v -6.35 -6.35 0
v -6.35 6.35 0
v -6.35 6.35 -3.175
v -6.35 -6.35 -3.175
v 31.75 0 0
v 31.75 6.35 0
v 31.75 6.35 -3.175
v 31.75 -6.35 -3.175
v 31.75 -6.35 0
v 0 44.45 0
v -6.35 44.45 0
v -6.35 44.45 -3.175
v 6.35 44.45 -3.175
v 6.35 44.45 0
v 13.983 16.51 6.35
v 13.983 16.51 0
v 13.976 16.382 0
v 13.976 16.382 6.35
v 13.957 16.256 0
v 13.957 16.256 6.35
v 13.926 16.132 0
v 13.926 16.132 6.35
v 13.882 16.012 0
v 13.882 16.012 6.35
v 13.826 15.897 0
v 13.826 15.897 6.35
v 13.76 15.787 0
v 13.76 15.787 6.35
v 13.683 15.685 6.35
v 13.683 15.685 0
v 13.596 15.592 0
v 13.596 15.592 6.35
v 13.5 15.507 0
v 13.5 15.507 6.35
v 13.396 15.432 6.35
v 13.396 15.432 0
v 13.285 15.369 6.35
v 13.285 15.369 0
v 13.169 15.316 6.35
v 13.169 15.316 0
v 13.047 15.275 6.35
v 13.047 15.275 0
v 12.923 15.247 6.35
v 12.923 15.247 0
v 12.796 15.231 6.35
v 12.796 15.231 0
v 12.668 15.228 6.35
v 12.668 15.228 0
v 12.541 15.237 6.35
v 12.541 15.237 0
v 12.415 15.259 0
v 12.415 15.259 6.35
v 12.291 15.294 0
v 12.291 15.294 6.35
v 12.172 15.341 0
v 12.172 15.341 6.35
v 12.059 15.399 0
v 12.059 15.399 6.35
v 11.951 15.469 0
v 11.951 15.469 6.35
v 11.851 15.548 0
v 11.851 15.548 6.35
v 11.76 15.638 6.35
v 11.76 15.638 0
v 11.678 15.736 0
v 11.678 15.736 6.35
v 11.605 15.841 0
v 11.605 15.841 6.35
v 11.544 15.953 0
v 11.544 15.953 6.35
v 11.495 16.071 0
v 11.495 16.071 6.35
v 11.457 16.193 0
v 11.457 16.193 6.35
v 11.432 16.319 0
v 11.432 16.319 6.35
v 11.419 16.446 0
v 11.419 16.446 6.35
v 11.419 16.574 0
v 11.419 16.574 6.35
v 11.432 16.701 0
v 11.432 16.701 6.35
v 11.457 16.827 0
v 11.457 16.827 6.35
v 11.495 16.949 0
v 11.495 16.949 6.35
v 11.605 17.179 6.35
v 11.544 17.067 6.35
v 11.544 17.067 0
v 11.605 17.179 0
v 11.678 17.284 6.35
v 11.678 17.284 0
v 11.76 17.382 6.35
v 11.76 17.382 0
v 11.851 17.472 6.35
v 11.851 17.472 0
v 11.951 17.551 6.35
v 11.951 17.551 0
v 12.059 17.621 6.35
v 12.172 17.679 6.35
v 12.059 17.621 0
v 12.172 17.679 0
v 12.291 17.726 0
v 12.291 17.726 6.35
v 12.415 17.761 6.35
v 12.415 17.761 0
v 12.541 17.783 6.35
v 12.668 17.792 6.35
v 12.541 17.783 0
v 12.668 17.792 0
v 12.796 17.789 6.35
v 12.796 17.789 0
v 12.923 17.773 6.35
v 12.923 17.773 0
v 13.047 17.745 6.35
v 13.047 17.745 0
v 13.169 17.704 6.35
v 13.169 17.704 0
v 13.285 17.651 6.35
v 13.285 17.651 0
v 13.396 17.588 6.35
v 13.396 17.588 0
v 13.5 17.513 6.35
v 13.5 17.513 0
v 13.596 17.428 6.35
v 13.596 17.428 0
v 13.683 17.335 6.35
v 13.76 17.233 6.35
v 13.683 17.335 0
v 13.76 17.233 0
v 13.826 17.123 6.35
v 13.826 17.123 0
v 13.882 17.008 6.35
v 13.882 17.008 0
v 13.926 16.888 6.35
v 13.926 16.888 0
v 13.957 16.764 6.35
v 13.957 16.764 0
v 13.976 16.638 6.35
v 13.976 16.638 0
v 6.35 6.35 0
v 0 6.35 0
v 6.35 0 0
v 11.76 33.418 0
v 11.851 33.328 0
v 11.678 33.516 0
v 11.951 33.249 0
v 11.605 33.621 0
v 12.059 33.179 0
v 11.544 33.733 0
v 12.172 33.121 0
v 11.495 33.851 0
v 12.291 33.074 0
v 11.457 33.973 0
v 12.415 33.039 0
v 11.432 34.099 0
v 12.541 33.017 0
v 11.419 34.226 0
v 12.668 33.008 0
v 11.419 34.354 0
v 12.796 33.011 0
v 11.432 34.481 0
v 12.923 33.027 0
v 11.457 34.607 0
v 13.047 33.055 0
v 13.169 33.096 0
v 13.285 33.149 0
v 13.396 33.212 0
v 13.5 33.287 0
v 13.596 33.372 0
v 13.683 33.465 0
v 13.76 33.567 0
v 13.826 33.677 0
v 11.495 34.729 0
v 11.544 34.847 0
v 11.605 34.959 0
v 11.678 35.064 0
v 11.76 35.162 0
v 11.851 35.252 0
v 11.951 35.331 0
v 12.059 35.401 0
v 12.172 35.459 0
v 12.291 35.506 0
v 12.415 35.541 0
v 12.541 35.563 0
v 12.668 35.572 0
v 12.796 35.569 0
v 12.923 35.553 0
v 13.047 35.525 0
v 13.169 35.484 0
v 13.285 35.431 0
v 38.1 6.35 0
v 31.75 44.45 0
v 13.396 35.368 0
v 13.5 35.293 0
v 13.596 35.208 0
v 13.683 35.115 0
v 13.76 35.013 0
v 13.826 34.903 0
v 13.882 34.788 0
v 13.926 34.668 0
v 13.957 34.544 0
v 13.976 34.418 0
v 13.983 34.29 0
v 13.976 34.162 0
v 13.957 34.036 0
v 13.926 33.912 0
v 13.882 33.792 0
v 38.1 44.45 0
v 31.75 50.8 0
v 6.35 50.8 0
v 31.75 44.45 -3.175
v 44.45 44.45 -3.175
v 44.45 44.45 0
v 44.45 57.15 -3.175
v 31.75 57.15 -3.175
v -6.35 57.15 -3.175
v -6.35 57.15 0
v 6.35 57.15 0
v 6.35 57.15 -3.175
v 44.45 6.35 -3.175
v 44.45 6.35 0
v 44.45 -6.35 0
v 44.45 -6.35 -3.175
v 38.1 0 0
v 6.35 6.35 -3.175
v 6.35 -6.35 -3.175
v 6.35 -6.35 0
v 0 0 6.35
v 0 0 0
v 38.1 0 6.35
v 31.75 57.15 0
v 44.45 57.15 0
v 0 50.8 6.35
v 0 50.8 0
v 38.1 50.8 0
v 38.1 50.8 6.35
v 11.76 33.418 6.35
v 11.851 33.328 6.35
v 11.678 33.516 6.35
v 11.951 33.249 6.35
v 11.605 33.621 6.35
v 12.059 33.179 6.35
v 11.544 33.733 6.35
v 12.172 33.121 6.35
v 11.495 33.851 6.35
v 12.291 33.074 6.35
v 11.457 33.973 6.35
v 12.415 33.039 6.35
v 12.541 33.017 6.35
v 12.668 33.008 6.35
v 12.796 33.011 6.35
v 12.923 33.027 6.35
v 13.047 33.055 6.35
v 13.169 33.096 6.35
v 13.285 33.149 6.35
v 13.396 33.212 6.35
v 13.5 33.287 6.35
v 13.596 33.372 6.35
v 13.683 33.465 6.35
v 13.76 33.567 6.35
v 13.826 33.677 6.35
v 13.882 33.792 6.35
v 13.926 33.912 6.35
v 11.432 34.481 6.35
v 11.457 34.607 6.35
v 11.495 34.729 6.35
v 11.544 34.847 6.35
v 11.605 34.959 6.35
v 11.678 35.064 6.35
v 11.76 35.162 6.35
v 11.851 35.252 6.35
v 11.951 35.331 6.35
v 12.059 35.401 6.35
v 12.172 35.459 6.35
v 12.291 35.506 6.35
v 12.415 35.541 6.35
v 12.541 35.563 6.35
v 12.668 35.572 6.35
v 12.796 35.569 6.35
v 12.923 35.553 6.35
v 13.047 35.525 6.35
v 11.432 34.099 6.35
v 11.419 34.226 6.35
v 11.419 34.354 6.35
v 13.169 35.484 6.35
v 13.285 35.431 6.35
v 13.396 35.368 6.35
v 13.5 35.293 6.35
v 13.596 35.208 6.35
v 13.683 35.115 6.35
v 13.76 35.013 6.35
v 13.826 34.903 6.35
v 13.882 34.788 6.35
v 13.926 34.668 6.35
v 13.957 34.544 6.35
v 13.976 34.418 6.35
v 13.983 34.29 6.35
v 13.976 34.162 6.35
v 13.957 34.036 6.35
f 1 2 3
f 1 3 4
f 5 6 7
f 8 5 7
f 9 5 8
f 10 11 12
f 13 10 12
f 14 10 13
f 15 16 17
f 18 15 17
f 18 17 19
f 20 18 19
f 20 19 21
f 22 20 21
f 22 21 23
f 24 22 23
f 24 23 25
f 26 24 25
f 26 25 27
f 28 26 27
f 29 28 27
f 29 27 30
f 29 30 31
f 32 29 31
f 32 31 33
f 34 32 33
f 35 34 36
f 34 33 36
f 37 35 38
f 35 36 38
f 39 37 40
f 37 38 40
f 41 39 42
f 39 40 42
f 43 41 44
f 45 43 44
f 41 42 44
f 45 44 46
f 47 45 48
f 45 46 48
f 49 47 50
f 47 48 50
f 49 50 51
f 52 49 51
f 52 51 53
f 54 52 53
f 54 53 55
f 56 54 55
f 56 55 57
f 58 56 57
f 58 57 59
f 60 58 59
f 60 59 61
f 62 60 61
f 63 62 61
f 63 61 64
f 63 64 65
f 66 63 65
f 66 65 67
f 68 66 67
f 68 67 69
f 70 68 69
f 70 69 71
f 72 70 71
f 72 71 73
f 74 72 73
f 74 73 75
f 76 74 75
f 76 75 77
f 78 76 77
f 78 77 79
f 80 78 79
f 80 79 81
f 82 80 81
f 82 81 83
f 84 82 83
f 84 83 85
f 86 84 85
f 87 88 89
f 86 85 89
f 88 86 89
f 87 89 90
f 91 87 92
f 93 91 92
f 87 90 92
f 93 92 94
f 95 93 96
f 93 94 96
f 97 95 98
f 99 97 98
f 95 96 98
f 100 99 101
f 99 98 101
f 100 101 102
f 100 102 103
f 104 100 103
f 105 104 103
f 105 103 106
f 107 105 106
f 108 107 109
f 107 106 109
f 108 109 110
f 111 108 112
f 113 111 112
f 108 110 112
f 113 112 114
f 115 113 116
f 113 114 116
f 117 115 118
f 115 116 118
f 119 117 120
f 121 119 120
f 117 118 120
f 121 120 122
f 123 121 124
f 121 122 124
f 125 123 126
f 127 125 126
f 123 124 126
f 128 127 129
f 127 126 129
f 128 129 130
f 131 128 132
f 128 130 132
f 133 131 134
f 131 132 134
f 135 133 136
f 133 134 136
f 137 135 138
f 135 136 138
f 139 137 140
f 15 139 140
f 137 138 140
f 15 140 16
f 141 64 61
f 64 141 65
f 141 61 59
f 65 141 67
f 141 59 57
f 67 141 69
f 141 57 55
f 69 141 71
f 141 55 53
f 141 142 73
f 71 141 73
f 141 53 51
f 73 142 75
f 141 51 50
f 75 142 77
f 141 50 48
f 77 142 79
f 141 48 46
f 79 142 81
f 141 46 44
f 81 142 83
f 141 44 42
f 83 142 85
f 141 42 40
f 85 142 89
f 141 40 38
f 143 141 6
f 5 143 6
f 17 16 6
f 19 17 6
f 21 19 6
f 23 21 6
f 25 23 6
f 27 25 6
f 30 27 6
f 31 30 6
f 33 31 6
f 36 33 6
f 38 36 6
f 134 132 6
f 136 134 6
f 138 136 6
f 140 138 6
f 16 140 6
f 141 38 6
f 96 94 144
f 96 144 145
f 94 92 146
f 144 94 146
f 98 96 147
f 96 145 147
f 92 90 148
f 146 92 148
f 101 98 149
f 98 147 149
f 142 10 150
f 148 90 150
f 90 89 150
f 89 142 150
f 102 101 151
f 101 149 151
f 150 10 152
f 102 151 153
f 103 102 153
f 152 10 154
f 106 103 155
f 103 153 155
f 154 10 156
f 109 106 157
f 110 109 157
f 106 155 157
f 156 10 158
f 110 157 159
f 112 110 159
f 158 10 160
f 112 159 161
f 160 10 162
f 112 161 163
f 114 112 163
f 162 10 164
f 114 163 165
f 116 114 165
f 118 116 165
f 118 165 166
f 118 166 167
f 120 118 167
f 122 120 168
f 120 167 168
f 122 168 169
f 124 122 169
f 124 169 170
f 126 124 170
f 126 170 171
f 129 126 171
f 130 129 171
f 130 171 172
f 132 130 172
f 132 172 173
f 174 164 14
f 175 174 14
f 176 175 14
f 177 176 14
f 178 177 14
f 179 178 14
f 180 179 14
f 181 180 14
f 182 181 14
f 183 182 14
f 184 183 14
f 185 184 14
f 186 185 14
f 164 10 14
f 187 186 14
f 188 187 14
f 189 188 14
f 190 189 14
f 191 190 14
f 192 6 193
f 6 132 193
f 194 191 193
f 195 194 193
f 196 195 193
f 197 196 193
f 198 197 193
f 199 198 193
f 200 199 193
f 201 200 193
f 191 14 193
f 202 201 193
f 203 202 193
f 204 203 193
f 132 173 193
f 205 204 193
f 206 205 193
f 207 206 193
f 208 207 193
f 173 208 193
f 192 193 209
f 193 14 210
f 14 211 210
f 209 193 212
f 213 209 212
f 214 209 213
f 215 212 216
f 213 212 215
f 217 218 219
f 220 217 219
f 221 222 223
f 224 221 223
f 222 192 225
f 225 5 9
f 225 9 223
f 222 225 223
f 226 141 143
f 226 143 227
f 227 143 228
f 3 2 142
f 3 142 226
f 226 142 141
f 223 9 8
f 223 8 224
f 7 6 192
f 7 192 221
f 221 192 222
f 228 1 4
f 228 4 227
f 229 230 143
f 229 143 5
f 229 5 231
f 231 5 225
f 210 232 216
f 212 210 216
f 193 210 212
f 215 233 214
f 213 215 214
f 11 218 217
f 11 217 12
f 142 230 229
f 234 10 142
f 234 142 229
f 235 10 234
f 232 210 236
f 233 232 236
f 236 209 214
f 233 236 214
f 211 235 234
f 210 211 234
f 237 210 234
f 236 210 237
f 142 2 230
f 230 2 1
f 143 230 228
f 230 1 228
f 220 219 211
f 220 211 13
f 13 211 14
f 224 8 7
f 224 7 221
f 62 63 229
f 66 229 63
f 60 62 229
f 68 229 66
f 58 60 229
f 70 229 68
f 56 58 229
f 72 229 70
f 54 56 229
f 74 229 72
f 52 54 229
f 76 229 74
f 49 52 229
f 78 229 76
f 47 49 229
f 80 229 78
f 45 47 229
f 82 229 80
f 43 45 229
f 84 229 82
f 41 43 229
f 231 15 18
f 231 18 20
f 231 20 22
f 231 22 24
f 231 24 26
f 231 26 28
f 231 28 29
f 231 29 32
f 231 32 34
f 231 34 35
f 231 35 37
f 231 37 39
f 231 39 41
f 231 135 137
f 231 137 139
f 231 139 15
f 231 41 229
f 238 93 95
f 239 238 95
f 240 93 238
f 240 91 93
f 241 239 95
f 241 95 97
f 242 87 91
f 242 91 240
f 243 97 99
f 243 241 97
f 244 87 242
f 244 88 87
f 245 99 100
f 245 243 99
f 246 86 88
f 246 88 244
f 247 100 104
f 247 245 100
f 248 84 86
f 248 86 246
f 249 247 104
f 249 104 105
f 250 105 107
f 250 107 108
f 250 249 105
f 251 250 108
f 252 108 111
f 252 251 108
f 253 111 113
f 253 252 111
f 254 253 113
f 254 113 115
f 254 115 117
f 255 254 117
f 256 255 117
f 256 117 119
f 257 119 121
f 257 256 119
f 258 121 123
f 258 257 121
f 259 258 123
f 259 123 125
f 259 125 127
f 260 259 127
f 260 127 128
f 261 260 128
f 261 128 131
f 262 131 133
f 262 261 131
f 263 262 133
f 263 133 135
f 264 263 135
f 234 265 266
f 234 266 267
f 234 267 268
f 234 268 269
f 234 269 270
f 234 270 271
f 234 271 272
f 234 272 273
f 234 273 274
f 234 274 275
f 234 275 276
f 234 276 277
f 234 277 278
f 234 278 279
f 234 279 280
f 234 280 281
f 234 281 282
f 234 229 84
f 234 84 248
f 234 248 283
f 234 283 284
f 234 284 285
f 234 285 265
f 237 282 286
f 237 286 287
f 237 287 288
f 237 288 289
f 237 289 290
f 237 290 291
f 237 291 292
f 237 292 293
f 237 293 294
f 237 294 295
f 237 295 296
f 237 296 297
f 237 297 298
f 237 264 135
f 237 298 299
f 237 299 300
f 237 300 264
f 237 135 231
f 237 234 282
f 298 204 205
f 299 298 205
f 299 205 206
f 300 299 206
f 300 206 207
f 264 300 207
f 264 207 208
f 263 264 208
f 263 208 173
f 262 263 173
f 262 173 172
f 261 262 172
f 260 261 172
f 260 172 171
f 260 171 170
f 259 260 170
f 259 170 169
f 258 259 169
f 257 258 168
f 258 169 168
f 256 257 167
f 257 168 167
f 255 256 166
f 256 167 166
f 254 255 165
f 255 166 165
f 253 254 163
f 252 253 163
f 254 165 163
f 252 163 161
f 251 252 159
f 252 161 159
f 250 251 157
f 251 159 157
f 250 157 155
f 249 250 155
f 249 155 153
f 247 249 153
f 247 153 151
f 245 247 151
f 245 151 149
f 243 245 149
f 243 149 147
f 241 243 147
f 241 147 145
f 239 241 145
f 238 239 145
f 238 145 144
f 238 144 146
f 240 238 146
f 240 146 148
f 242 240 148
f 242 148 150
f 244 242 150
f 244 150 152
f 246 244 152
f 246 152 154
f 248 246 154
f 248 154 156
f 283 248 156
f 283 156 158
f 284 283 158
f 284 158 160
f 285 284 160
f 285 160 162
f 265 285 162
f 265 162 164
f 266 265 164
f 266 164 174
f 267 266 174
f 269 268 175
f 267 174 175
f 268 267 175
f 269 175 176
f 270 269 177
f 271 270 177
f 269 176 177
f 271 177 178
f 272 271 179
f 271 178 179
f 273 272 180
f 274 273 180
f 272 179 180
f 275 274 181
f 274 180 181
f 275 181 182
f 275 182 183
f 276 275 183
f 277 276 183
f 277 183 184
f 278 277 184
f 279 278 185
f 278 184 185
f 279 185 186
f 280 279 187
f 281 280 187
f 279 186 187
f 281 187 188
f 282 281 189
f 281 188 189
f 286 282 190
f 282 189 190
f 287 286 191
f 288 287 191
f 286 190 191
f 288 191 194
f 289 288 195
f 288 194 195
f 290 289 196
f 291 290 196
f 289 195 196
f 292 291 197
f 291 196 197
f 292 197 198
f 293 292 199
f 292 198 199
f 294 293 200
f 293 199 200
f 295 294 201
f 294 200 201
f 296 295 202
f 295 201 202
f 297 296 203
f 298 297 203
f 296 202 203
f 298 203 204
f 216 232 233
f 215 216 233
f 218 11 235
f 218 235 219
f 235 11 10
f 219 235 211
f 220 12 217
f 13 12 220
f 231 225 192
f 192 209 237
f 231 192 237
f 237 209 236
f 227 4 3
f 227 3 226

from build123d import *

# Parameters (mm, degrees)
F0_W     = 38.1
F0_H     = 50.8
F1_DEPTH = 6.35
F2_W     = 12.7
F2_H     = 12.7
F3_DEPTH = 3.175
F4_R     = 1.2827
F5_DEPTH = 25.4


with BuildPart() as f1:
    # F0 (on Top) → F1 (new body)
    with BuildSketch(Plane.XY):
        with Locations((19.05, 25.4)):
            Rectangle(F0_W, F0_H)
    extrude(amount=F1_DEPTH)

    # F2 (on face) → F3 (join)
    with BuildSketch(Plane(origin=(0, 0, 0), x_dir=(1, 0, 0), z_dir=(0, 0, -1))):
        Rectangle(F2_W, F2_H)
        with Locations((38.1, 0)):
            Rectangle(F2_W, F2_H)
        with Locations((0, -50.8)):
            Rectangle(F2_W, F2_H)
        with Locations((38.1, -50.8)):
            Rectangle(F2_W, F2_H)
    extrude(amount=F3_DEPTH)

    # F4 (on face) → F5 (cut)
    with BuildSketch(Plane(origin=(0, 0, 0), x_dir=(1, 0, 0), z_dir=(0, 0, -1))):
        with Locations((12.7, -16.51)):
            Circle(F4_R)
        with Locations((12.7, -34.29)):
            Circle(F4_R)
    extrude(amount=-F5_DEPTH, mode=Mode.SUBTRACT)


solid = f1.part
